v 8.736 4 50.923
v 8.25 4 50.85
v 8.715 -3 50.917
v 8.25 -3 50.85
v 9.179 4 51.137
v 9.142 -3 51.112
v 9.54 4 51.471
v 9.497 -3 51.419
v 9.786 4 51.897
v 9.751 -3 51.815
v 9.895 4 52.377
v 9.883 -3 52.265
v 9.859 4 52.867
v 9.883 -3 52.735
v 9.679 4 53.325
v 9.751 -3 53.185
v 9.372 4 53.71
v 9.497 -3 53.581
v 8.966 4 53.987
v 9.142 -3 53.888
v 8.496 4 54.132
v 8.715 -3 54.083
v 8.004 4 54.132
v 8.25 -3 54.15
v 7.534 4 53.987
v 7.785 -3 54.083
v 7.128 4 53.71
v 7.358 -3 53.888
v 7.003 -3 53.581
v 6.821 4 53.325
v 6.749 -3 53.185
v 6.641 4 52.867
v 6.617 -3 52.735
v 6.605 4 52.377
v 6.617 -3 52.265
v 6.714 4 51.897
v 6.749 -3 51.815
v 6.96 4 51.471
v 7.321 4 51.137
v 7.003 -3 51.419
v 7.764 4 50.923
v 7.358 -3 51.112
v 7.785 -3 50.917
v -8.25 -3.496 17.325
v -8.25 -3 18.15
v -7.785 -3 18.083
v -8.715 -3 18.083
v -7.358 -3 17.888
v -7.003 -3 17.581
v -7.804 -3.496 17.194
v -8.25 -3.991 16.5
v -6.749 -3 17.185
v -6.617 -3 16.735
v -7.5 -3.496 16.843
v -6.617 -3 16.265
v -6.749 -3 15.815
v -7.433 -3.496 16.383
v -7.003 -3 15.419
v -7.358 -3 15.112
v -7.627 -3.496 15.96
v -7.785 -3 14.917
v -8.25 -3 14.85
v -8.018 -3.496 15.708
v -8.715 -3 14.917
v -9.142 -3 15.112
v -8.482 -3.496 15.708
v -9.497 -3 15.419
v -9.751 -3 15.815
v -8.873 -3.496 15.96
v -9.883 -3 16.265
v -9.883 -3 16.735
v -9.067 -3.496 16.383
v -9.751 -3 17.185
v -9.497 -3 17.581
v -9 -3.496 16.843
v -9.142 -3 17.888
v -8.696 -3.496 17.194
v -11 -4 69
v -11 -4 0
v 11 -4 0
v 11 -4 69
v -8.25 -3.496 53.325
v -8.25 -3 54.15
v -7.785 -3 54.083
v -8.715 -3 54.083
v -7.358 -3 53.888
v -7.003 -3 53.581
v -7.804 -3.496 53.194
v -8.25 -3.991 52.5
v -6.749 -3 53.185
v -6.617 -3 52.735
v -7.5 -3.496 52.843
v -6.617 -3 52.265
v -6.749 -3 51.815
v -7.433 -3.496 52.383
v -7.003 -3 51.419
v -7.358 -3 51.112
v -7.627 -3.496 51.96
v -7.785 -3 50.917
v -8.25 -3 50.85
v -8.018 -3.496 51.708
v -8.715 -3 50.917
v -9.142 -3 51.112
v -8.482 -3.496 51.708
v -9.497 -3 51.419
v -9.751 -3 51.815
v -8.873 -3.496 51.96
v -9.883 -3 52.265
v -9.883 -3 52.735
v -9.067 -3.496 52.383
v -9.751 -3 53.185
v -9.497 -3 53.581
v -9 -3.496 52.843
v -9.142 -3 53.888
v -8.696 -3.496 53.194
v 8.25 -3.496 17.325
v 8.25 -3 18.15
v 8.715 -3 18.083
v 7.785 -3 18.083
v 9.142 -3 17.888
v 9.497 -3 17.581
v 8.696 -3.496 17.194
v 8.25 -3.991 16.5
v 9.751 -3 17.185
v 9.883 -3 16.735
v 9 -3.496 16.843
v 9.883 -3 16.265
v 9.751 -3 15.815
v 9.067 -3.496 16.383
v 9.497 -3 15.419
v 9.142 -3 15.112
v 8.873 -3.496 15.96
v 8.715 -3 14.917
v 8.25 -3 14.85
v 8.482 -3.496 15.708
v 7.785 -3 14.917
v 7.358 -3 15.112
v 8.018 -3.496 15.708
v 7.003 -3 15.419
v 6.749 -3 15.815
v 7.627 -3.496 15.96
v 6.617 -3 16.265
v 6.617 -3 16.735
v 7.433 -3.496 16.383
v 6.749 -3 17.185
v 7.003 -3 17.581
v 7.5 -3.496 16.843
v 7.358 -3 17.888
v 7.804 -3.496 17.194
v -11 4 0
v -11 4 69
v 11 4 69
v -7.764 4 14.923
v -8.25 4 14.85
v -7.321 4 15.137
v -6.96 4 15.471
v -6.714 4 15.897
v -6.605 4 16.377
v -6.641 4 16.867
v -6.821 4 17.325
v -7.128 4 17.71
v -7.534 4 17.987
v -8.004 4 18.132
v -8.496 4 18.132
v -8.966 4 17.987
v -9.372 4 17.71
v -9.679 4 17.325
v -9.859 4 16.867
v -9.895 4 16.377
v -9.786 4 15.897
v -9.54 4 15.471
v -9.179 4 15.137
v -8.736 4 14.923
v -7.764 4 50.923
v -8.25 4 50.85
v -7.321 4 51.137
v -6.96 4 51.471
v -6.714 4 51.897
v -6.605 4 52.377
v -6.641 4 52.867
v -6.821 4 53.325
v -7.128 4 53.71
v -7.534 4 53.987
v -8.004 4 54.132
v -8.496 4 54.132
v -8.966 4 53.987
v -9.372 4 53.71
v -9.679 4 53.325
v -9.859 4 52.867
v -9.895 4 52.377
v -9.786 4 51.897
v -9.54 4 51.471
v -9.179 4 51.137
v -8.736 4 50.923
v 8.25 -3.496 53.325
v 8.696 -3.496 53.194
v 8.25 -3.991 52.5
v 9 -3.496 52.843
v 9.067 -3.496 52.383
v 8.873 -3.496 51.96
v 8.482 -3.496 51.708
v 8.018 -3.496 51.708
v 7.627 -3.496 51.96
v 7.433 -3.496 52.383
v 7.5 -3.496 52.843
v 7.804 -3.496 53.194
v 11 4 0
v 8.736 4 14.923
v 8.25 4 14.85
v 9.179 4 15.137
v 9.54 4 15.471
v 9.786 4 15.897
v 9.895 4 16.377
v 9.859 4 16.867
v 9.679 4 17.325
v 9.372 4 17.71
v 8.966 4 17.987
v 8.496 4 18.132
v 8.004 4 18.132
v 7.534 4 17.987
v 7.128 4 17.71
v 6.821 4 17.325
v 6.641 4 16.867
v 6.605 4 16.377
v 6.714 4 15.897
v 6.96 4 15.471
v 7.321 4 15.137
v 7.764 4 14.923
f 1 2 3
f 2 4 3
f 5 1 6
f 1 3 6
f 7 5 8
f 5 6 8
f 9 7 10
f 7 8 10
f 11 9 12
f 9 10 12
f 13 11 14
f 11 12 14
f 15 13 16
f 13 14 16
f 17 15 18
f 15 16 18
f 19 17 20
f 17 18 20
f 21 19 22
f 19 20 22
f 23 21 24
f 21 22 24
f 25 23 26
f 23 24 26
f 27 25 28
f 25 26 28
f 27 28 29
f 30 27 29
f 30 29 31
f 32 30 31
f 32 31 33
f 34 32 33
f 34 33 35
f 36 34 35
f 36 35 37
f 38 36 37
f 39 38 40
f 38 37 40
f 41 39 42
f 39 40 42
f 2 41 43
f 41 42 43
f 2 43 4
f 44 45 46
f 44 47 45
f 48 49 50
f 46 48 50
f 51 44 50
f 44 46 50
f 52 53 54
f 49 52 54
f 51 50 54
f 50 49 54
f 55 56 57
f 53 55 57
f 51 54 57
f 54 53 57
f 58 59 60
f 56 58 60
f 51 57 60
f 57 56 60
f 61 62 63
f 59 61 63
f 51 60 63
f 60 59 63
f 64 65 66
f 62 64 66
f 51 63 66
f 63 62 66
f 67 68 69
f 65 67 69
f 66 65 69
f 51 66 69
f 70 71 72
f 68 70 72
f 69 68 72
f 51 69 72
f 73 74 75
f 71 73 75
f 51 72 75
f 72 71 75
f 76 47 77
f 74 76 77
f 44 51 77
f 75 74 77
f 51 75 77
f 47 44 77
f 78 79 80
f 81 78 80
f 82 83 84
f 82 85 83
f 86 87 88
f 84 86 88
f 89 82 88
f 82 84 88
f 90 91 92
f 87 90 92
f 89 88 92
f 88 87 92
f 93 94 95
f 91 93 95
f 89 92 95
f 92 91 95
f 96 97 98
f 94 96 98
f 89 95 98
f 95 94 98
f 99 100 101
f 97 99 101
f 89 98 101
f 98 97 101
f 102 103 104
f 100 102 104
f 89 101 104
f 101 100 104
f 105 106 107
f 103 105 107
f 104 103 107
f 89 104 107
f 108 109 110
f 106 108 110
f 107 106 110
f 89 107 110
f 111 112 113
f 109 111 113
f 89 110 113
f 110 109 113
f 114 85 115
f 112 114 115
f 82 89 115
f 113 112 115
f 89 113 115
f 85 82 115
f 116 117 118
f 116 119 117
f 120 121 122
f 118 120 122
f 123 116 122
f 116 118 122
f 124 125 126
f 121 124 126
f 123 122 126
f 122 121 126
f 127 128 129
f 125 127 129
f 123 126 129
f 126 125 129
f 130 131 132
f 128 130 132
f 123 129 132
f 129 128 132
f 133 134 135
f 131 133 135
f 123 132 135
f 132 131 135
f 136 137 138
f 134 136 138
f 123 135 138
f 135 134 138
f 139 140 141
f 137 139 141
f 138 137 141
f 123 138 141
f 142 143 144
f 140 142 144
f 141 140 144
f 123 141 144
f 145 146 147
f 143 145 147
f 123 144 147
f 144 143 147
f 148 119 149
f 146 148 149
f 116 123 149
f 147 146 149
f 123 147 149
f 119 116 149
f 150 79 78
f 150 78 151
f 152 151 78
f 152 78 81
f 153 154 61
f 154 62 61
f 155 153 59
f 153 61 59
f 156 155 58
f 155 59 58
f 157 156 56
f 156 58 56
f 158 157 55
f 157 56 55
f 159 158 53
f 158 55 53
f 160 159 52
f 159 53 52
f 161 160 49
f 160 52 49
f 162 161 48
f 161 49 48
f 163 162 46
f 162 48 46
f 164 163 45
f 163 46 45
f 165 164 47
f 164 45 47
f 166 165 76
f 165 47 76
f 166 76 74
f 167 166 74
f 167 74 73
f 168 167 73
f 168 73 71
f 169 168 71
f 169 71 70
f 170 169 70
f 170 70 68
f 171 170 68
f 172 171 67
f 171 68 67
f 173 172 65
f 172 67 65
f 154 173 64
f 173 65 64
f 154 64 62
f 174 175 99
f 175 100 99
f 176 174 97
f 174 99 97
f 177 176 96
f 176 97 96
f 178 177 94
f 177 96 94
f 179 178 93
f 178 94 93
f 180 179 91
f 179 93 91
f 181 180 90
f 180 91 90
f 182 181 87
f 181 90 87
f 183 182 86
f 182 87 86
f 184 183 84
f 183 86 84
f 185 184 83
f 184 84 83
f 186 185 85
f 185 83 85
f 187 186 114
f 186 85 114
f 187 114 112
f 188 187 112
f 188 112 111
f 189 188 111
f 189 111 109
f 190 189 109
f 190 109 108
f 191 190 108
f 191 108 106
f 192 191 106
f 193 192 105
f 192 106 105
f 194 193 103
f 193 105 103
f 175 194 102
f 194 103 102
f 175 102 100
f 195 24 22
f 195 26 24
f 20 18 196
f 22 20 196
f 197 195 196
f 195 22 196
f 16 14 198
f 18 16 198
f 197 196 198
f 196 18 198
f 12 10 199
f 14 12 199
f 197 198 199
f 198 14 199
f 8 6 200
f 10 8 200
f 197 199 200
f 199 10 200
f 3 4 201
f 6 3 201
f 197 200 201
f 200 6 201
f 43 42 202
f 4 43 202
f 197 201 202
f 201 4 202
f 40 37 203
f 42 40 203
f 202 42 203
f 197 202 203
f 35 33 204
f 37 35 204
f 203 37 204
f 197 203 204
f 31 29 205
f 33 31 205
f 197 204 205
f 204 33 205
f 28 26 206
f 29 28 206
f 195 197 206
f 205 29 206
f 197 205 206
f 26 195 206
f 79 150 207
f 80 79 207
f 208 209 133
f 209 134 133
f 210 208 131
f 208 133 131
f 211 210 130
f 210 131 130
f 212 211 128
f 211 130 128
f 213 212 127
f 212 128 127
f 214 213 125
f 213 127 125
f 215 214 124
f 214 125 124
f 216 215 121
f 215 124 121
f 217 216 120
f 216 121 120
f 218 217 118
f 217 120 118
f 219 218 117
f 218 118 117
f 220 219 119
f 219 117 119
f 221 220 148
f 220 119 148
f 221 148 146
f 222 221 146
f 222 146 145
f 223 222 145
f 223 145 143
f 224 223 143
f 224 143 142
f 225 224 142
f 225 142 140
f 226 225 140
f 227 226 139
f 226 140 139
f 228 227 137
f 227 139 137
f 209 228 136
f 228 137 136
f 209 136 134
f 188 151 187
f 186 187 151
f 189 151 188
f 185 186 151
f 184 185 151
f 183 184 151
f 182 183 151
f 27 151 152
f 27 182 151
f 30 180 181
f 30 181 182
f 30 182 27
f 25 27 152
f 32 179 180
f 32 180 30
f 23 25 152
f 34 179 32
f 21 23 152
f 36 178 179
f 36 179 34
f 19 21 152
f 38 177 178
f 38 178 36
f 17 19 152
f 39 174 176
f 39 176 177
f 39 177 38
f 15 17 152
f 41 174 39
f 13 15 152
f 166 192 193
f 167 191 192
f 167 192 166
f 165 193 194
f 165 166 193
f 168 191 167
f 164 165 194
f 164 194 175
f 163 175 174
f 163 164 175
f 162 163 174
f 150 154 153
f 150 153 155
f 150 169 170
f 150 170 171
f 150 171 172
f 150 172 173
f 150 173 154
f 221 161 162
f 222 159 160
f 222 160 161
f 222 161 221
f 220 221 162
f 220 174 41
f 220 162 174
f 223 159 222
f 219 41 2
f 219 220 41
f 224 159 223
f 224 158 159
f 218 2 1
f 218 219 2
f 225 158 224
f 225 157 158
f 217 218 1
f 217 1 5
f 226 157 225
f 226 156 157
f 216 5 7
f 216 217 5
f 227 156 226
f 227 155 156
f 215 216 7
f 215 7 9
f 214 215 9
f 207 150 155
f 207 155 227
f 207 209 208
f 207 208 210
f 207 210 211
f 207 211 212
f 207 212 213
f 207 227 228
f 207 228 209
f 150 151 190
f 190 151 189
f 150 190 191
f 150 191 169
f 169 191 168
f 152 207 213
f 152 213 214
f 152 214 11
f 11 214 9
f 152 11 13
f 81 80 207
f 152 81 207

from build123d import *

# Parameters (mm, degrees)
SKETCH_1_W             = 22
SKETCH_1_H             = 8
EXTRUDE_1_DEPTH        = 69
HOLE_WIZARD_M4_1_D     = 3.3
HOLE_WIZARD_M4_1_DEPTH = 7
HOLE_WIZARD_M4_1_TIP   = 0.991420021


with BuildPart() as part:
    # 草图1 → 凸台-拉伸1 (new body)
    with BuildSketch(Plane.XY):
        Rectangle(SKETCH_1_W, SKETCH_1_H)
    extrude(amount=EXTRUDE_1_DEPTH)

    # M4 螺纹孔1
    with Locations(Plane(origin=(-8.25, 4, 16.5), x_dir=(0, 0, 1), z_dir=(0, 1, 0))):
        with Locations((0, 0), (0, 16.5), (36, 16.5), (36, 0)):
            Hole(HOLE_WIZARD_M4_1_D / 2, depth=HOLE_WIZARD_M4_1_DEPTH)
            with Locations((0, 0, -(HOLE_WIZARD_M4_1_DEPTH + HOLE_WIZARD_M4_1_TIP / 2))):  # 118° drill point
                Cone(0, HOLE_WIZARD_M4_1_D / 2, HOLE_WIZARD_M4_1_TIP, mode=Mode.SUBTRACT)


solid = part.part
